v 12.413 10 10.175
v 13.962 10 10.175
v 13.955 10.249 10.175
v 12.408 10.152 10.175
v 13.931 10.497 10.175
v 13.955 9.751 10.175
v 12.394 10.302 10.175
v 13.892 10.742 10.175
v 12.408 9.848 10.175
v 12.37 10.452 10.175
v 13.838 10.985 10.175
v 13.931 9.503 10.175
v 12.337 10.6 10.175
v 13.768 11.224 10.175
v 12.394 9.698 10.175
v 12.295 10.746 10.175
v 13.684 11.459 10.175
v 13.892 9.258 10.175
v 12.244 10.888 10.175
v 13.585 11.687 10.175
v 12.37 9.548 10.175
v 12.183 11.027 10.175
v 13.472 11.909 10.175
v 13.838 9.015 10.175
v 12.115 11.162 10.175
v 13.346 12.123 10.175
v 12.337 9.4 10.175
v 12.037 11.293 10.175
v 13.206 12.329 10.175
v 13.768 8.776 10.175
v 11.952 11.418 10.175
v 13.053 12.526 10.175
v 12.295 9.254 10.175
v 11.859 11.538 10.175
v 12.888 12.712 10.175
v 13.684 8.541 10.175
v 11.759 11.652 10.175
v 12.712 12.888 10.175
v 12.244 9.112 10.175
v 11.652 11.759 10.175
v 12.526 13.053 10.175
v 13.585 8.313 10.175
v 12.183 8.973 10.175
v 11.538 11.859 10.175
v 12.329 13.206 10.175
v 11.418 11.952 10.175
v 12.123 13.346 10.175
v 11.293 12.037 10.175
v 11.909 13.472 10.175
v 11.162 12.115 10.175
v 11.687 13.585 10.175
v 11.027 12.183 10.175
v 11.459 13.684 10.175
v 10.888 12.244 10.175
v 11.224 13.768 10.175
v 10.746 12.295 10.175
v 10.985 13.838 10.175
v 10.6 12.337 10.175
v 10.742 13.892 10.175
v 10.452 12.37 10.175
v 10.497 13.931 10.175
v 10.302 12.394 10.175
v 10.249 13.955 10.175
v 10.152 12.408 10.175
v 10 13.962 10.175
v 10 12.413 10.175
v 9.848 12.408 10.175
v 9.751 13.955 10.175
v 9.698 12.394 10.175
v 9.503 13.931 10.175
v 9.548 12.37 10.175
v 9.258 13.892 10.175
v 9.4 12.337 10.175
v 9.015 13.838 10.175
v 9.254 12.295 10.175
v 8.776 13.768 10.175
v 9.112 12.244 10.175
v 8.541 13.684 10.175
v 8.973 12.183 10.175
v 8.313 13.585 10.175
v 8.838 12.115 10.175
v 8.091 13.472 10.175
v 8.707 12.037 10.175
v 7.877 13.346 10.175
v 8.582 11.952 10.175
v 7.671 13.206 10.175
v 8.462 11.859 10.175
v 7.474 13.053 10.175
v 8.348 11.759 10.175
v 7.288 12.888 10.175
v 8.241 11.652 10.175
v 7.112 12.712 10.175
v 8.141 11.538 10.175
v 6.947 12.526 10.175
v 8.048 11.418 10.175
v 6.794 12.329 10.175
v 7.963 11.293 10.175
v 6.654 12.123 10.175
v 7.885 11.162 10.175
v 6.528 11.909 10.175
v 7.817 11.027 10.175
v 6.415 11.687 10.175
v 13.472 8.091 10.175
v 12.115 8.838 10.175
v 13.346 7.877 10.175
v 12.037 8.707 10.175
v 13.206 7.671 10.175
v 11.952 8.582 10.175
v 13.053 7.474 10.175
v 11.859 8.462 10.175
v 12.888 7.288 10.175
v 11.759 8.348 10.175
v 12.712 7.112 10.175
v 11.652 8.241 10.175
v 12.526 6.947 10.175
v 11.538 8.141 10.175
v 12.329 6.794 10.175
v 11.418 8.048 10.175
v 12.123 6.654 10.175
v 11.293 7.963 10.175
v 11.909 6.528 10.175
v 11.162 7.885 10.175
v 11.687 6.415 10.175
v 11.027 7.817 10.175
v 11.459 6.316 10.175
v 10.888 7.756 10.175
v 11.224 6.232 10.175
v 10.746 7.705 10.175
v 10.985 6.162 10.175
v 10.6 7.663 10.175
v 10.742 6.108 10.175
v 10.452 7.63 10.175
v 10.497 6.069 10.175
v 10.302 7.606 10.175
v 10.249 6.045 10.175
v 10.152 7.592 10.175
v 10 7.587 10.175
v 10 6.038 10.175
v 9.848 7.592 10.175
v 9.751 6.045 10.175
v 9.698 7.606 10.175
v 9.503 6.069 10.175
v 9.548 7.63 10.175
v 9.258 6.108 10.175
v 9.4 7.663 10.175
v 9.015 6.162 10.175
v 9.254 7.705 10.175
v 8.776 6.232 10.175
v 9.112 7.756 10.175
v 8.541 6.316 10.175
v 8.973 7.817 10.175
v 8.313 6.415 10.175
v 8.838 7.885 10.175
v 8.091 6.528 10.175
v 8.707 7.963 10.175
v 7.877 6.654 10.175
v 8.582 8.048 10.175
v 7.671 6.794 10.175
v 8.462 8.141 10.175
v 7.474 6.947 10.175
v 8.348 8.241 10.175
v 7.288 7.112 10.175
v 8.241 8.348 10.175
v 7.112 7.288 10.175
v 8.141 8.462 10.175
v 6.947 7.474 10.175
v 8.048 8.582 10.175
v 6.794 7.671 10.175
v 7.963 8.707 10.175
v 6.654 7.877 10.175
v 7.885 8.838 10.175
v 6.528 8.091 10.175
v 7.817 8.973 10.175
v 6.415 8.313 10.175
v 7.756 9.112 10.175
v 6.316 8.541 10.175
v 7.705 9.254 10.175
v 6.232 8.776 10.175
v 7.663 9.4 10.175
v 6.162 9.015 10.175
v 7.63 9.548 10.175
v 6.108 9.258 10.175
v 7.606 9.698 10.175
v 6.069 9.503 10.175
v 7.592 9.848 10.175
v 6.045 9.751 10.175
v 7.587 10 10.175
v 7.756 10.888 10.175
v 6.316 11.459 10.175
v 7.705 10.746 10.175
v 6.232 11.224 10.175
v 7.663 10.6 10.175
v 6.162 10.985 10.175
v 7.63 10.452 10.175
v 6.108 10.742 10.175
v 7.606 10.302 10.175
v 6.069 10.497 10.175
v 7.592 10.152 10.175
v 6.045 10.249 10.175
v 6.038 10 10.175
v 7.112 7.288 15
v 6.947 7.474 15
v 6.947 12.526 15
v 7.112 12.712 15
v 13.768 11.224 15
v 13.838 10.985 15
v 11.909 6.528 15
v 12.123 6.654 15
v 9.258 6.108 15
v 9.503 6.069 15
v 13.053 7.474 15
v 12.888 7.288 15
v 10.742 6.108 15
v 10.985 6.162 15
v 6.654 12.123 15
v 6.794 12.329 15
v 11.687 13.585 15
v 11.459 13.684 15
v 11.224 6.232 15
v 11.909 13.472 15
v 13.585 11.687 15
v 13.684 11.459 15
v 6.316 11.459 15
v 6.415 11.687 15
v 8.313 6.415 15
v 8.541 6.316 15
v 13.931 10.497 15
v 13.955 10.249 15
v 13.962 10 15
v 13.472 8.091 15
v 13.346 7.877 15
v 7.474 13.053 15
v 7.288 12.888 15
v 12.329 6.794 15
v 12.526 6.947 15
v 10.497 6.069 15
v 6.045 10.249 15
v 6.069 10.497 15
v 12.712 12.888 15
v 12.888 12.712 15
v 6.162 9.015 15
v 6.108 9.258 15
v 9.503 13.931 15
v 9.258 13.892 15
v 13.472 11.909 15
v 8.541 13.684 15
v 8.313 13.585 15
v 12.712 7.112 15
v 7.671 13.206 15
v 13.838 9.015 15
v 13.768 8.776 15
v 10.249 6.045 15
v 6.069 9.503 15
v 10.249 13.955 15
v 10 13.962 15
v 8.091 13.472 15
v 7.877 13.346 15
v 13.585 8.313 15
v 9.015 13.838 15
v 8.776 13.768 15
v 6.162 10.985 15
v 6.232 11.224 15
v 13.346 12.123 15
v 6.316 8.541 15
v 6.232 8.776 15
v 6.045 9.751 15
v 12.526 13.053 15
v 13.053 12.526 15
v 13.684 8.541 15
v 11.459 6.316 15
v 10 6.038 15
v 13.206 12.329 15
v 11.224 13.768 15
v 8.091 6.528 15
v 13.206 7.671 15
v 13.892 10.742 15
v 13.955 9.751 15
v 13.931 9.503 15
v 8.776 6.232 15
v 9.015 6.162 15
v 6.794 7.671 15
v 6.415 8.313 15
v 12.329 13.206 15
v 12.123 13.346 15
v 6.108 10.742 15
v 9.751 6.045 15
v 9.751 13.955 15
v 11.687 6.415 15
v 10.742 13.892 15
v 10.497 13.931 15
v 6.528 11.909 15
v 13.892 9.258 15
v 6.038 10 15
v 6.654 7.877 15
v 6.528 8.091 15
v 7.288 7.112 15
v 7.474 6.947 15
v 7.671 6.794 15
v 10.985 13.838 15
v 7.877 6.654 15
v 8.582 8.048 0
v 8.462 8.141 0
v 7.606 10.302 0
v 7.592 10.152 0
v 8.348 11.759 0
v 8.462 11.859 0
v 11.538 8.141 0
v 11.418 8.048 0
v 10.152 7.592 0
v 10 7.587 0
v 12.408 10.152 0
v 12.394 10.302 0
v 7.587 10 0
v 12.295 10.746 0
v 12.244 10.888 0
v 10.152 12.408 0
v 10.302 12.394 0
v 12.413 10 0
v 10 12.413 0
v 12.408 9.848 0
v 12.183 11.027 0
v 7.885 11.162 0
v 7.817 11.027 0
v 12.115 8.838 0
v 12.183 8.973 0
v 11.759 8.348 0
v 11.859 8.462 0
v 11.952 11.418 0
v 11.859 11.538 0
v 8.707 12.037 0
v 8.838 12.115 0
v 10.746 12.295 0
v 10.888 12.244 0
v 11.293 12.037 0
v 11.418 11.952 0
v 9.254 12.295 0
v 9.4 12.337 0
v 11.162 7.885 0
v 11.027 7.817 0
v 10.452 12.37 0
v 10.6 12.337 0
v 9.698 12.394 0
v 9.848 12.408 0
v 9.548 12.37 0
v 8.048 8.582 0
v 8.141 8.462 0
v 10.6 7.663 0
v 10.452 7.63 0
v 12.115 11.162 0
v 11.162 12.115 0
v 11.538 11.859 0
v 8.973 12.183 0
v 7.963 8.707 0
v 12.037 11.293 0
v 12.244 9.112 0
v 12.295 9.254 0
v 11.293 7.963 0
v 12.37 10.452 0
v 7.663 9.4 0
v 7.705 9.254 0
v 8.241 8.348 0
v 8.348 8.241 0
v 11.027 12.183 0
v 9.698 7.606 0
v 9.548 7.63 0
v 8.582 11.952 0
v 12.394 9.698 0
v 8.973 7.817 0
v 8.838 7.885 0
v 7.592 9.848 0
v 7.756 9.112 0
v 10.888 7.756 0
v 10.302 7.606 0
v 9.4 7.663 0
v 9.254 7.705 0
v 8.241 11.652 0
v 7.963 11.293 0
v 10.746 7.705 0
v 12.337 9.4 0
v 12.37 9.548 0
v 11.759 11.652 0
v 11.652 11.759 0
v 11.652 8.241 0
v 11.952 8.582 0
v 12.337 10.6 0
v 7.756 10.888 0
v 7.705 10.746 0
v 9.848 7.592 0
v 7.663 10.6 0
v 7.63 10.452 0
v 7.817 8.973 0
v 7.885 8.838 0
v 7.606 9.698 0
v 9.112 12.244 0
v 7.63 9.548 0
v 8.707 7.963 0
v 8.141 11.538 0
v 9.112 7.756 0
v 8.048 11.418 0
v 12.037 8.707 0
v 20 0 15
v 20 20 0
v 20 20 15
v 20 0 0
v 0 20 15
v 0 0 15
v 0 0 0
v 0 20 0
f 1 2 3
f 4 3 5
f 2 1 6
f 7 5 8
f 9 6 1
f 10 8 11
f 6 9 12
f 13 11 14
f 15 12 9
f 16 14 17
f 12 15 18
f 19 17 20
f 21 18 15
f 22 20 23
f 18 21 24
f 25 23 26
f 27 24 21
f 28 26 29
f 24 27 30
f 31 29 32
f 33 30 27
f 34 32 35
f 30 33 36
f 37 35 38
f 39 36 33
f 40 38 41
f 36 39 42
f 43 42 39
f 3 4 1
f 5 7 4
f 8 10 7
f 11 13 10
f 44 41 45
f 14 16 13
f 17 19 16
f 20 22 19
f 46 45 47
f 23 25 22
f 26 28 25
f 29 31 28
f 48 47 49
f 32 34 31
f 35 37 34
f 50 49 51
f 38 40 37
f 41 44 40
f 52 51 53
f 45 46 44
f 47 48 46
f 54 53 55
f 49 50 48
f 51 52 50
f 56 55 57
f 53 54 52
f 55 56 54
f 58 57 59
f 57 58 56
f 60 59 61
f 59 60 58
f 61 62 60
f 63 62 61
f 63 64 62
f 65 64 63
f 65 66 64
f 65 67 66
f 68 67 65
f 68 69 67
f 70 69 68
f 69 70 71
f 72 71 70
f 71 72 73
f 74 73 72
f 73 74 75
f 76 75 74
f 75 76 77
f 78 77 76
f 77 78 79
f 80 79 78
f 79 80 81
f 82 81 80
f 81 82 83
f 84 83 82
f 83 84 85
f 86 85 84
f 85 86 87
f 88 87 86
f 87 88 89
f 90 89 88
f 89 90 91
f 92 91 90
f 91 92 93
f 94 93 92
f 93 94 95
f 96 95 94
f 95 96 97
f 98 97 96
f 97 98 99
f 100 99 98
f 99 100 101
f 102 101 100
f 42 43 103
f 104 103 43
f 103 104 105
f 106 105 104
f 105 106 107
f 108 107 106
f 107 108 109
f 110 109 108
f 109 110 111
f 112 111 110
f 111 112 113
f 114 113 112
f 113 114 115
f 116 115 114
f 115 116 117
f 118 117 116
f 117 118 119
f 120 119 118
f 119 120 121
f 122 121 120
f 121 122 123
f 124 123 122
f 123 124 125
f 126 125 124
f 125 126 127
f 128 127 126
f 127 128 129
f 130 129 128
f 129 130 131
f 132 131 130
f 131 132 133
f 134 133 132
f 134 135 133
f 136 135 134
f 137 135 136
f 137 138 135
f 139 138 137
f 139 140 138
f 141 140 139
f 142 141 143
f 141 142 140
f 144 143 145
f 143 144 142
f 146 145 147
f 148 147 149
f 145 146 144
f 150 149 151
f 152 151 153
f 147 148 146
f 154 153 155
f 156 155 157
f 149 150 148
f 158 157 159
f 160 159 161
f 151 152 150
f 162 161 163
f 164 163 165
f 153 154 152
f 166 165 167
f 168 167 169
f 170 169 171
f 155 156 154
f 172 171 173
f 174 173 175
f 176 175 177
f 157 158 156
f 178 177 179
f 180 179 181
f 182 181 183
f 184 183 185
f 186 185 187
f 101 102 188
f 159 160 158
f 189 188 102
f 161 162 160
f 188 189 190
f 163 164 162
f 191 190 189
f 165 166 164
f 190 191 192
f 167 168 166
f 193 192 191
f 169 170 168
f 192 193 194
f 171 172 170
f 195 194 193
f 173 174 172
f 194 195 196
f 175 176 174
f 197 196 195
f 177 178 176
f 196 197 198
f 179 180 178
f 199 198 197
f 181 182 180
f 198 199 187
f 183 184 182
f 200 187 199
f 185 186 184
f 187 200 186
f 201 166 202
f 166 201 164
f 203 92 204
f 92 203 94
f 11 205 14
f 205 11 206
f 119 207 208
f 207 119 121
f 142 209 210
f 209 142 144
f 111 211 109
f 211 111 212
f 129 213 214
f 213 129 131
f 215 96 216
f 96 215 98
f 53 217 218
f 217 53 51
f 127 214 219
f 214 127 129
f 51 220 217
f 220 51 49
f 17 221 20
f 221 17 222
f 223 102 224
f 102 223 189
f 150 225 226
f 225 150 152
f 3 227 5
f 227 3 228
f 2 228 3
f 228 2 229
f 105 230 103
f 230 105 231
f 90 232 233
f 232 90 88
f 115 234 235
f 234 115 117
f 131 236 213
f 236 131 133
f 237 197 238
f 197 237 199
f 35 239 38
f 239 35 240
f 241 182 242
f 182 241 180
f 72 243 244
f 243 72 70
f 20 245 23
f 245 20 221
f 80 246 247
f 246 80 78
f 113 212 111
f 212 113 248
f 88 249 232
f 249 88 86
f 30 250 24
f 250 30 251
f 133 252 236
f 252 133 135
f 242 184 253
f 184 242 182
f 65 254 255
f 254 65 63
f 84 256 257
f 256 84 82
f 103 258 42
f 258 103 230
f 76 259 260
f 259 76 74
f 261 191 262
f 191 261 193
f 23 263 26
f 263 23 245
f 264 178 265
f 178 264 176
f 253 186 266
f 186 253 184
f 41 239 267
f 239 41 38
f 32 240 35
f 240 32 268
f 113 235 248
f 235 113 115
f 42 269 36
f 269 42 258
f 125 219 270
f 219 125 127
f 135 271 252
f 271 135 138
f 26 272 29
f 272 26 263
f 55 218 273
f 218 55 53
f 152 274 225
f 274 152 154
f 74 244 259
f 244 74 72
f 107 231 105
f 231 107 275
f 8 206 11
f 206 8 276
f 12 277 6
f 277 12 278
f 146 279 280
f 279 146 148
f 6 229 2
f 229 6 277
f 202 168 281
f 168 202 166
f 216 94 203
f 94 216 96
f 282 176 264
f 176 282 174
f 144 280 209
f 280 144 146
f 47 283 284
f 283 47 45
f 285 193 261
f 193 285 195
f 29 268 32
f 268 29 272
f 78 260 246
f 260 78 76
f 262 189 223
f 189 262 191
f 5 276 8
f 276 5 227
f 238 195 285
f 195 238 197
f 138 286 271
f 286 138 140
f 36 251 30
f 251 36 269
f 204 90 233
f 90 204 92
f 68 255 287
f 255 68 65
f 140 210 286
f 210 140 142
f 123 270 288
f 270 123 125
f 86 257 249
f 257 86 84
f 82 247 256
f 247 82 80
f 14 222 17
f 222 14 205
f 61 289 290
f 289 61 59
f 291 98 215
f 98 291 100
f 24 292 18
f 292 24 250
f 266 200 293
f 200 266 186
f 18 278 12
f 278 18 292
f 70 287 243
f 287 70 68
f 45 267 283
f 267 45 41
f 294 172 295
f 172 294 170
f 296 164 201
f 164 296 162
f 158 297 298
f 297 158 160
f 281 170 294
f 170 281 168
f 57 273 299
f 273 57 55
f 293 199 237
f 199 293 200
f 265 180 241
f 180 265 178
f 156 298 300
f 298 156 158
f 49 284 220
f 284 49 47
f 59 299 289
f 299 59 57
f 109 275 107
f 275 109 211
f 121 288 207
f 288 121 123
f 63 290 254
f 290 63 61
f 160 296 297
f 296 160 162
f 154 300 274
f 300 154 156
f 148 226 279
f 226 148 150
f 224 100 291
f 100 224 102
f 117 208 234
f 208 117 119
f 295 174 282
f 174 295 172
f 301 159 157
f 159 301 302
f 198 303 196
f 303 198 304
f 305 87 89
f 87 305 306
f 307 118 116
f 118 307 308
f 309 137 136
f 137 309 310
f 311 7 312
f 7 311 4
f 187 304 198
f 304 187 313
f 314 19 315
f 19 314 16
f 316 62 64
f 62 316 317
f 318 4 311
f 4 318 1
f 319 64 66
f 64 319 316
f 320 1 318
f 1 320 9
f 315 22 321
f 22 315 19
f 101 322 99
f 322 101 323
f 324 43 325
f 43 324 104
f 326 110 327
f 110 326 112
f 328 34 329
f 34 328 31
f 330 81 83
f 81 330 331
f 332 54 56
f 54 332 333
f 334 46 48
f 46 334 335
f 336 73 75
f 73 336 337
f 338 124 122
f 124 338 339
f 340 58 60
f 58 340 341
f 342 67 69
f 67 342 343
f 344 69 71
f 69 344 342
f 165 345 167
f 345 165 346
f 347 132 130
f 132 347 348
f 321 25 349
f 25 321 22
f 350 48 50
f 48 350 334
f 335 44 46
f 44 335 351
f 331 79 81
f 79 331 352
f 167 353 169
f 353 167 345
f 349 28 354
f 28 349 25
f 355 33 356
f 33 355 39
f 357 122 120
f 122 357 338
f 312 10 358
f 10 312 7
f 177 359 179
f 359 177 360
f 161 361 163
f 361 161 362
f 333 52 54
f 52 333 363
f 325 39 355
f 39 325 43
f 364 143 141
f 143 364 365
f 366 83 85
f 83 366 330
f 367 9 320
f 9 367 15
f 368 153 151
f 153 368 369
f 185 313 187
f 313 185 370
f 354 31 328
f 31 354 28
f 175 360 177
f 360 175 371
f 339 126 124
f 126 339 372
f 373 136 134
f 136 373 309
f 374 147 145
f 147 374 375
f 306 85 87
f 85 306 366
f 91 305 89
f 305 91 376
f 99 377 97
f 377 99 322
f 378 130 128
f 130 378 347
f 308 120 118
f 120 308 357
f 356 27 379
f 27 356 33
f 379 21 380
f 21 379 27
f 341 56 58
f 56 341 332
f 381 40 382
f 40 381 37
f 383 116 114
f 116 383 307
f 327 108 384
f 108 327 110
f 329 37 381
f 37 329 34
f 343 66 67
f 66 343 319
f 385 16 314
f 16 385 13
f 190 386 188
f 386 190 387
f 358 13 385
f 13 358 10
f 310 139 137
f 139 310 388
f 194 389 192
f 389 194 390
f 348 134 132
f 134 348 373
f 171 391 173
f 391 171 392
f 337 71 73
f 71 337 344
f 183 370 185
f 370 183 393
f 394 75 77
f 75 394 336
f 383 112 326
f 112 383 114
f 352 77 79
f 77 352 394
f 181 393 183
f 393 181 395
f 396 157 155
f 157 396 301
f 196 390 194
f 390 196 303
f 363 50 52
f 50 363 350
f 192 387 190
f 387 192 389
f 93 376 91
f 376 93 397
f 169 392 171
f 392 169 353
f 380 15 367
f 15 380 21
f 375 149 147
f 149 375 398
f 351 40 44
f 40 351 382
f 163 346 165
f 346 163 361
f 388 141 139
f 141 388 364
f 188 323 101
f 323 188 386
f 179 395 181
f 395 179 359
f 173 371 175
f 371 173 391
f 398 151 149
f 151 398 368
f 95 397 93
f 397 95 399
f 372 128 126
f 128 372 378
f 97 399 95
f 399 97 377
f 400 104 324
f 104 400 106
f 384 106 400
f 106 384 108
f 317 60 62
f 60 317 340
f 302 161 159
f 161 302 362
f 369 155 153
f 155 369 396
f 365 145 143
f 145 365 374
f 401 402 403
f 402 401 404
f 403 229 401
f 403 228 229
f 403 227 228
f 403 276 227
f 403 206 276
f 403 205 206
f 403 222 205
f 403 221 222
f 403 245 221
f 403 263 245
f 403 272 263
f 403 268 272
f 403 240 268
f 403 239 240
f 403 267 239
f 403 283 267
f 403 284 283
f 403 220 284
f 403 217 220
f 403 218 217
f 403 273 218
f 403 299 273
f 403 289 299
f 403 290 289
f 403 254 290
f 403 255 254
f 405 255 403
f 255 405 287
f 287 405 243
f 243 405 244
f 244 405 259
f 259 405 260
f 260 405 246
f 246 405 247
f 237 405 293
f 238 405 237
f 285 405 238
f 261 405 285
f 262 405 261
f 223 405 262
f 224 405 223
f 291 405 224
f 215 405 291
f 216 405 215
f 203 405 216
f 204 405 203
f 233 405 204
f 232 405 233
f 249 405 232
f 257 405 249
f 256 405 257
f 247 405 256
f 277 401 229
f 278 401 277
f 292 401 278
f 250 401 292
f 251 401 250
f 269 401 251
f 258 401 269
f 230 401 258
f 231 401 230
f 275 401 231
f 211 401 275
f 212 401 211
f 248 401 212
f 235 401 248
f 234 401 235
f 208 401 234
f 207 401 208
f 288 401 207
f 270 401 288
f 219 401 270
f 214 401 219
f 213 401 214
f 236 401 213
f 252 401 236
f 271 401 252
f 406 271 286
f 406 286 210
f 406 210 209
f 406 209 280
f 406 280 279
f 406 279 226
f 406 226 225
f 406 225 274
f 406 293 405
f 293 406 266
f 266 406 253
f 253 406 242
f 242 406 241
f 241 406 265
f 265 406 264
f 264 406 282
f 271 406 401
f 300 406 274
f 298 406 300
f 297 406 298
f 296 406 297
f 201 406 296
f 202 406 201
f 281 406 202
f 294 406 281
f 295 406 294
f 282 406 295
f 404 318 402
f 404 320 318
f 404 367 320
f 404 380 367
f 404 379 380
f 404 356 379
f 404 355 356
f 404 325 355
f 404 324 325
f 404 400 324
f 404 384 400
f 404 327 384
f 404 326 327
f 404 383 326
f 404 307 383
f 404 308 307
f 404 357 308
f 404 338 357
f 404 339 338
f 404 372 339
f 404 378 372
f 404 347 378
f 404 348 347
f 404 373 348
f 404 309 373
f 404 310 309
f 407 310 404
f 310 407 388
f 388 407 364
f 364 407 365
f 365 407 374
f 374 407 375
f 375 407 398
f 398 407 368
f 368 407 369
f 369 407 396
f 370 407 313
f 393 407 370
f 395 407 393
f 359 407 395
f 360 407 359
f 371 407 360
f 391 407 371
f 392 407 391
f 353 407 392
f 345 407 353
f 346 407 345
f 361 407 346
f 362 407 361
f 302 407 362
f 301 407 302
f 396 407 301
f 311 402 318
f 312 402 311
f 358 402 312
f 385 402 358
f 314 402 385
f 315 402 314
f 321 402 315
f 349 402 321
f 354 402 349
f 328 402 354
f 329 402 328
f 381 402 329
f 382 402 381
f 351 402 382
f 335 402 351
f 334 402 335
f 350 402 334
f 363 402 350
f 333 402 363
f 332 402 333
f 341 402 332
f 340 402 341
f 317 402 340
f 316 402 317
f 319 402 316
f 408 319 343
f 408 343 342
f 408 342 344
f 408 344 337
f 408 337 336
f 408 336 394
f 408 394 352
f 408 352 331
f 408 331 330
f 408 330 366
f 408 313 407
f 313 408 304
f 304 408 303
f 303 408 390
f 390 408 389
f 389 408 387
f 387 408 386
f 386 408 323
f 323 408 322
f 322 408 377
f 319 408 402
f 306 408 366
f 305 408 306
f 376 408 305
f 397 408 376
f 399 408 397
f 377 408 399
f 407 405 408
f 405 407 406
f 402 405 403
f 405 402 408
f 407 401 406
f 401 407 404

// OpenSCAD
// file: ScrewsUNC/Internal/ScrewsUNC-core-NutSelector.scad
//Copyright 2019 Robert Witts
//This library is licensed under the LGPL 3.0 See http://creativecommons.org/licenses/LGPL/3.0/
include<ScrewsUNC-core-modules.scad>;

fullNut = 0;
nylocNut = 1;
domeNut = 2;
thinSquareNut = 3;
studdingConnector = 4;
squareNut = 5;
wingNut = 6;
wingNutAllowTurn = 7;

function isNutInScrewsUNC(nutType, size) = nutType == fullNut? isValueInScrewsUNC(size, fullNutH):
nutType == nylocNut? isValueInScrewsUNC(size, nylocNutH):
nutType == domeNut? isValueInScrewsUNC(size, domeNutTotalH):
nutType == thinSquareNut? isValueInScrewsUNC(size, thinSquareNutH):
nutType == studdingConnector? isValueInScrewsUNC(size, studdingConnectorNutL):
nutType == squareNut? isValueInScrewsUNC(size, squareNutH):
nutType == wingNut? isValueInScrewsUNC(size, wingNutWingH):
nutType == wingNutAllowTurn? isValueInScrewsUNC(size, wingNutWingH):
ScrewsUNC_nut_type_does_not_exist___Try_another_type();

function UNC_getNutH(nutType, size) = nutType == fullNut? UNC(size, fullNutH):
nutType == nylocNut? UNC(size, nylocNutH):
nutType == domeNut? UNC(size, domeNutTotalH):
nutType == thinSquareNut? UNC(size, thinSquareNutH):
nutType == studdingConnector? UNC(size, studdingConnectorNutL):
nutType == squareNut? UNC(size, squareNutH):
nutType == wingNut? UNC(size, wingNutWingH):
nutType == wingNutAllowTurn? UNC(size, wingNutWingH):
ScrewsUNC_nut_type_does_not_exist___Try_another_type();

function UNC_getNutSideH(nutType, size) = nutType == fullNut? UNC(size, fullNutH):
nutType == nylocNut? UNC(size, fullNutH):
nutType == domeNut? UNC(size, domeNutHexH):
nutType == thinSquareNut? UNC(size, thinSquareNutH):
nutType == studdingConnector? UNC(size, studdingConnectorNutL):
nutType == squareNut? UNC(size, squareNutH):
nutType == wingNut? UNC(size, wingNutBaseH):
nutType == wingNutAllowTurn? UNC(size, wingNutBaseH):
ScrewsUNC_nut_type_does_not_exist___Try_another_type();

function UNC_getNutPeakD(nutType, size) = nutType == fullNut? UNC(size, nutPeakD):
nutType == nylocNut? UNC(size, nutPeakD):
nutType == domeNut? UNC(size, nutPeakD):
nutType == thinSquareNut? UNC(size, squareNutPeakD):
nutType == studdingConnector? UNC(size, nutPeakD):
nutType == squareNut? UNC(size, squareNutPeakD):
nutType == wingNut? UNC(size, wingNutWingExtension):
nutType == wingNutAllowTurn? UNC(size, wingNutWingExtension):
ScrewsUNC_nut_type_does_not_exist___Try_another_type();

function UNC_getNutFlatD(nutType, size) = nutType == fullNut? UNC(size, nutFlatD):
nutType == nylocNut? UNC(size, nutFlatD):
nutType == domeNut? UNC(size, nutFlatD):
nutType == thinSquareNut? UNC(size, squareNutFlatD):
nutType == studdingConnector? UNC(size, nutFlatD):
nutType == squareNut? UNC(size, squareNutPeakD):
nutType == wingNut? UNC(size, wingNutBaseD):
nutType == wingNutAllowTurn? UNC(size, wingNutWingExtension):
ScrewsUNC_nut_type_does_not_exist___Try_another_type();

function ScrewsUNC_nut_type_does_not_exist___Try_another_type() = SG_proceedOnError?undef:ScrewsUNC_nut_type_does_not_exist___Try_another_type();

module UNC_Nut(nutType, size, ERR = 0, hollow = false, VertERR=0){
   if(nutType == fullNut){
      UNC_FullNut(size, ERR, hollow, VertERR);
   } else if(nutType == nylocNut){
      UNC_NylocNut(size, ERR, hollow, VertERR);
   } else if(nutType == domeNut){
      UNC_DomeNut(size, ERR, hollow, VertERR);
   } else if(nutType == thinSquareNut){
      UNC_ThinSquareNut(size, ERR, hollow, VertERR);
   } else if(nutType == studdingConnector){
      UNC_StuddingConnector(size, ERR, hollow, VertERR);
   } else if(nutType == squareNut){
      UNC_SquareNut(size, ERR, hollow, VertERR);
   } else if(nutType == wingNut){
      UNC_WingNutLocked(size, ERR, hollow, VertERR);
   } else if(nutType == wingNutAllowTurn){
      UNC_WingNutRotatable(size, ERR, hollow, VertERR);
   } else {
      echo("ERROR: Nut type not recognised, proceding with default nut");
      UNC_FullNut(size, length, ERR, hollow, VertERR);
   }
}
module UNC_NutHole(nutType, size, depth, ERR = 0, VertERR=0){
   if(nutType == fullNut){
      UNC_FullNutHole(size, depth, ERR, VertERR);
   } else if(nutType == nylocNut){
      UNC_NylocNutHole(size, depth, ERR, VertERR);
   } else if(nutType == domeNut){
      UNC_DomeNutHole(size, depth, ERR, VertERR);
   } else if(nutType == thinSquareNut){
      UNC_ThinSquareNutHole(size, depth, ERR, VertERR);
   } else if(nutType == studdingConnector){
      UNC_StuddingConnectorHole(size, depth, ERR, VertERR);
   } else if(nutType == squareNut){
      UNC_SquareNutHole(size, depth, ERR, VertERR);
   } else if(nutType == wingNut){
      UNC_WingNutLockedHole(size, depth, ERR, VertERR);
   } else if(nutType == wingNutAllowTurn){
      echo("WARNING: There is no way you would want a wing nut to be rotatable when immbedded in something, so the system will make it fixed, to remove this error, use wingNut as opposed to wingNutAllowTurn");
      UNC_WingNutRotatable(size, depth, ERR, VertERR);
   } else {
      echo("ERROR: Nut type not recognised, proceding with default nut");
      UNC_FullNut(size, length, ERR, VertERR);
   }
}
// file: ScrewsUNC/Internal/ScrewsUNC-NutSelector.scad
//Copyright 2019 Robert Witts
//This library is licensed under the LGPL 3.0 See http://creativecommons.org/licenses/LGPL/3.0/
include<ScrewsUNC-core-NutSelector.scad>;
function isNutInScrewsSystem(nutType, size) = isNutInScrewsUNC(nutType, size);
function getNutH(nutType, size) = UNC_getNutH(nutType, size);
function getNutSideH(nutType, size) = UNC_getNutSideH(nutType, size);
function getNutPeakD(nutType, size) = UNC_getNutPeakD(nutType, size);
function getNutFlatD(nutType, size) = UNC_getNutFlatD(nutType, size);
module Nut(nutType, size, ERR = 0, hollow = false, VertERR=0){
   UNC_Nut(nutType, size, ERR, hollow, VertERR);
}
module NutHole(nutType, size, depth, ERR = 0, VertERR=0){
   UNC_NutHole(nutType, size, depth, ERR, VertERR);
}
echo("ScrewsUNC Nut types: 'fullNut' 'nylocNut' 'domeNut' 'thinSquareNut' 'studdingConnector' 'squareNut' 'wingNut' 'wingNutAllowTurn' \n");
// file: ScrewsUNC/Internal/ScrewsUNC-Washers.scad
//Copyright 2019 Robert Witts
//This library is licensed under the LGPL 3.0 See http://creativecommons.org/licenses/LGPL/3.0/
include<ScrewsUNC-core-Washers.scad>;

function WasherDimensions(a, b, c) = UNC_WasherDimensions(a, b, c);

function isValueInWasherDatabase(a, b, c) = isValueInScrewsUNCWasher(a, b, c);

function getWasherT(a, b) = UNC_getWasherT(a, b);
function getWasherOuterD(a, b) = UNC_getWasherOuterD(a, b);

module Washer(form, size, ERR = 0, hollow = false, VertERR = 0){
   UNC_Washer(form, size, ERR, hollow, VertERR);
}
echo("ScrewsUNC Washer system loaded: Washer table 1,2,3,4 (3 and 4 in light and heavy) available, e.g. washerTable1\nTo create a washer use Washer(form, size);\nSpecific washers can also be created, but this is not reccomended, e.g. Table1Washer(size);\nTo access values in the database, use WasherDimensions(size, form, value), which contains washerT and washerOuterD\ngetWasherT(size, form) and getWasherOuterD(size, form) are shortcuts to this function\n");
// file: ScrewsUNC/Internal/ScrewsUNC-BoltSelector.scad
//Copyright 2019 Robert Witts
//This library is licensed under the LGPL 3.0 See http://creativecommons.org/licenses/LGPL/3.0/
include<ScrewsUNC-core-BoltSelector.scad>;

function isBoltInScrewsSystem(boltType, size) = isBoltInScrewsUNC(boltType, size);
function getHeadDiameter(boltType, size) = UNC_getHeadDiameter(boltType, size);
function getHeadHeight(boltType, size) = UNC_getHeadHeight(boltType, size);

module BoltOnSurface(boltType, size, length, ERR=0, hollow = false, silent = false){
    UNC_BoltOnSurface(boltType, size, length, ERR, hollow, silent);
}
module BoltFlushWithSurface(boltType, size, length, ERR=0, hollow = false, override = false, silent = false){
   UNC_BoltFlushWithSurface(boltType, size, length, ERR, hollow, override, silent);
}
module BoltNormalWithSurface(boltType, size, length, ERR=0, hollow = false, silent = false){
   UNC_BoltNormalWithSurface(boltType, size, length, ERR, hollow, silent);
}
module BoltInHoleFromTop(boltType, size, length, holeDepth, ERR=0, hollow = false, silent = false){
   UNC_BoltInHoleFromTop(boltType, size, length, holeDepth, ERR, hollow, silent);
}
module BoltInHoleFromBottom(boltType, size, length, holeDepth, ERR=0, hollow = false, silent = false){
   UNC_BoltInHoleFromBottom(boltType, size, length, holeDepth, ERR, hollow, silent);
}
module BoltInHoleFromNormal(boltType, size, length, holeDepth, ERR=0, hollow = false, silent = false){
   UNC_BoltInHoleFromNormal(boltType, size, length, holeDepth, ERR, hollow, silent);
}
echo("ScrewsUNC Bolt types: \'allenBolt\' \'allenButtonBolt\' \'allenCountersunkBolt\' \'hexHeadBolt\' \'hexFlangeBolt\' \'hexHeadBoltAllowSpin\'\n");
echo("ScrewsUNC bolt system utility functions: \'getHeadDiameter\' \'getHeadHeight\'");
echo("ScrewsUNC bolt system modules:  \'BoltOnSurface\' \'BoltFlushWithSurface\' \'BoltNormalWithSurface\' \'BoltInHoleFromTop\' \'BoltInHoleFromBottom\' \'BoltInHoleFromDefault\' \'BoltInHoleFromNormal\'\n");
// file: ScrewsUNC/Internal/ScrewsUNC-Modules.scad
//Copyright 2019 Robert Witts
//This library is licensed under the LGPL 3.0 See http://creativecommons.org/licenses/LGPL/3.0/
include <ScrewsUNC-core-modules.scad>;
module AllenBolt(size, length, ERR=0,hollow = false){
   UNC_AllenBolt(size, length, ERR,hollow);
}
module AllenBoltHole(size, length, holeDepth, ERR=0,hollow = false){
   UNC_AllenBoltHole(size, length, holeDepth, ERR,hollow);
}
module AllenButtonBolt(size, length, ERR=0,hollow = false){
   UNC_AllenButtonBolt(size, length, ERR,hollow);
}
module AllenButtonBoltHole(size, length, holeDepth, ERR=0,hollow = false){
   UNC_AllenButtonBoltHole(size, length, holeDepth, ERR,hollow);
}
module AllenCountersunkBolt(size, length, ERR=0,hollow = false){
   UNC_AllenCountersunkBolt(size, length, ERR,hollow);
}
module AllenCountersunkBoltHole(size, length, holeDepth, ERR=0,hollow = false){
   UNC_AllenCountersunkBoltHole(size, length, holeDepth, ERR,hollow);
}
module HexHeadBolt(size, length, ERR=0,hollow = false){
   UNC_HexHeadBolt(size, length, ERR,hollow);
}
module HexHeadBoltHole(size, length, holeDepth, ERR=0,hollow = false){
   UNC_HexHeadBoltHole(size, length, holeDepth, ERR,hollow);
}
module HexHeadBoltHoleAllowingSpin(size, length, holeDepth, ERR=0,hollow = false){
   UNC_HexHeadBoltHoleAllowingSpin(size, length, holeDepth, ERR,hollow);
}
module HexHeadFlangeBoltHole(size, length, holeDepth, ERR=0,hollow = false){
   UNC_HexHeadFlangeBoltHole(size, length, holeDepth, ERR,hollow);
}
module HexHeadFlangeBolt(size, length, ERR=0,hollow = false){
   UNC_HexHeadFlangeBolt(size, length, ERR,hollow);
}
module ThinSquareNut(size, ERR=0,hollow = false, VertERR=0){
   UNC_ThinSquareNut(size, ERR,hollow, VertERR);
}
module SquareNut(size, ERR=0,hollow = false, VertERR=0){
   UNC_SquareNut(size, ERR,hollow, VertERR);
}
module StuddingConnector(size, ERR=0,hollow = false, VertERR=0){
   UNC_StuddingConnector(size, ERR,hollow, VertERR);
}
module FullNut(size, ERR=0,hollow = false, VertERR=0){
   UNC_FullNut(size, ERR,hollow, VertERR);
}
module NylocNut(size, ERR=0,hollow = false, VertERR=0){
   UNC_NylocNut(size, ERR,hollow, VertERR);
}
module DomeNut(size, ERR=0,hollow = false, VertERR=0){
   UNC_DomeNut(size, ERR,hollow, VertERR);
}

module Rod(size, length, ERR=0, hollow = false){
   UNC_Rod(size, length, ERR=0, hollow = false);
}

module FullNutHole(size, distFromEdge, ERR=0, VertERR=0){
   UNC_FullNutHole(size, distFromEdge, ERR, VertERR);
}
module DomeNutHole(size, distFromEdge, ERR=0, VertERR=0){
   UNC_DomeNutHole(size, distFromEdge, ERR, VertERR);
}
module NylockNutHole(size, distFromEdge, ERR=0, VertERR=0){
   UNC_NylockNutHole(size, distFromEdge, ERR, VertERR);
}
module ThinSquareNutHole(size, distFromEdge, ERR=0, VertERR=0){
   UNC_ThinSquareNutHole(size, distFromEdge, ERR, VertERR);
}
module SquareNutHole(size, distFromEdge, ERR=0, VertERR=0){
   UNC_SquareNutHole(size, distFromEdge, ERR, VertERR);
}


module WingNutLockedHole(size, distFromEdge, ERR=0, VertERR=0){
   UNC_WingNutLockedHole(size, distFromEdge, ERR, VertERR);
}
module WingNutLocked(size, ERR=0, hollow = false, VertERR=0){
   UNC_WingNutLocked(size, ERR, hollow, VertERR);
}
module WingNutRotatable(size, ERR=0, hollow = false, VertERR=0){
   UNC_WingNutRotatable(size, ERR, hollow, VertERR);
}
echo("ScrewsUNC basic modules: 'AllenBolt' 'AllenBoltHole' 'HexHeadBolt' 'HexHeadBoltHole' 'HexHeadBoltHoleAllowingSpin' 'HexHeadFlangeBolt' 'HexHeadFlangeBoltHole' 'ThinSquareNut' 'SquareNut' 'StuddingConnector' 'FullNut' 'NylockNut' 'DomeNut' 'Rod' 'ThinSquareNutHole' 'SquareNutHole' 'StuddingConnectorHole' 'FullNutHole' 'NylockNutHole' 'DomeNutHole' 'AllenButtonBolt' 'AllenButtonBoltHole' 'AllenCountersunkBolt' 'AllenCountersunkBoltHole' 'WingNutLocked' 'WingNutRotatable' 'WingNutLockedHole'\n");
// file: ScrewsUNC/Internal/ScrewsUNC-Base.scad
//Copyright 2019 Robert Witts
//This library is licensed under the LGPL 3.0 See http://creativecommons.org/licenses/LGPL/3.0/
include <ScrewsUNC-core.scad>;
mm = 1;
inches = 25.4;
Units = mm;


function isValueInScrewsDatabase(a, b) = isValueInScrewsUNC(a, b);

function getRodD(a) = UNC_getRodD(a);

echo("ScrewsUNC is active, this will provide a set of values for you programmes to use, for creating holes for UNC parts, such as bolts, if you want metric bolts, then use ScrewsMetric instead, for both, use ScrewsUniversal, but do not use the individual ones. By default the system will work in mm, to change this use Units = inches;\n");
echo("The wing nuts in this system are of the american kind, with square ends to the wings, if you are not using these, please be careful, as yours may not fit.\n");

echo("ScrewsUNC available values: 'ScrewsUNC_name', 'boltD', 'nutFlatD', 'nutPeakD', 'fullNutH', 'domeNutHexH', 'domeNutTotalH', 'allenBoltHeadD', 'allenBoltHeadH', 'nylocNutH''', 'studdingConnectorNutL', 'squareNutFlatD', 'squareNutPeakD', 'thinSquareNutH', 'hexHeadBoltHeadH', 'hexFlangeHeadH', 'hexHeadFlatD', 'hexHeadPeakD', 'hexFlangeT', 'hexFlangeD', 'allenBoltKeySize', 'allenButtonBoltKeySize', 'allenCountersunkBoltKeySize', 'allenButtonBoltHeadD', 'allenButtonBoltHeadH', 'allenCountersunkBoltHeadD', 'allenCountersunkBoltHeadH' 'squareNutH' 'wingNutBaseH' 'wingNutBaseD' 'wingNutWingT' 'wingNutWingExtension' 'wingNutWingH' \n");
// file: ScrewsUNC/ScrewsUNC.scad
//Copyright 2019 Robert Witts
//This library is licensed under the LGPL 3.0 See http://creativecommons.org/licenses/LGPL/3.0/
include <Internal/ScrewsUNC-Base.scad>;
include <Internal/ScrewsUNC-Modules.scad>;
include <Internal/ScrewsUNC-BoltSelector.scad>;
include <Internal/ScrewsUNC-Washers.scad>;
include <Internal/ScrewsUNC-NutSelector.scad>;
// main file
//Copyright 2019 Robert Witts
//This library is licensed under the LGPL 3.0 See http://creativecommons.org/licenses/LGPL/3.0/
include <ScrewsUNC/ScrewsUNC.scad>;
H = 15;
W = 20;
L = 20;
boltSize = UNC10;
boltType = allenBolt;

nutType = fullNut;

washerForm = washerTable1;

$fn = 100;
GHOST = true;


module demo1(){
   difference(){
      cube([L, W, H]);
      translate([L/2, W/2, H+0.001])BoltNormalWithSurface(boltType, boltSize, H+0.002);
   }
}
module demo2(){
   difference(){
      cube([L, W, H]);
      translate([L/2, W/2, H+0.001])BoltNormalWithSurface(boltType, boltSize, H+0.002);
      translate([L/2, W/2, getNutSideH(nutType, boltSize)-0.001])rotate([180, 0, 0])Nut(nutType, boltSize);
   }
}
module demo3(){
   difference(){
      cube([L, W, H]);
      translate([L/2, -0.001, H/2])rotate([90, 0, 0])BoltOnSurface(boltType, boltSize, W+0.002);
      translate([L/2, W/2+getNutH(nutType, boltSize)/2, H/2])rotate([90, 90, 0])NutHole(nutType, boltSize, H/2+0.001);
      translate([L/2, -0.001, H/2])rotate([-90, 0, 0])Washer(washerForm, boltSize);
   }
}

//if you get the error: 
//ERROR: Recursion detected calling function 'ScrewsUNC_washer_dimension_not_found___Try_another_type'
//while using imperial bolts and washers, it may mean that the washer type you are using is incompatable with the size, as Table 1 and 2 washers are only available for the numeric sizes, while 3 and 4 are not.

demo1();
